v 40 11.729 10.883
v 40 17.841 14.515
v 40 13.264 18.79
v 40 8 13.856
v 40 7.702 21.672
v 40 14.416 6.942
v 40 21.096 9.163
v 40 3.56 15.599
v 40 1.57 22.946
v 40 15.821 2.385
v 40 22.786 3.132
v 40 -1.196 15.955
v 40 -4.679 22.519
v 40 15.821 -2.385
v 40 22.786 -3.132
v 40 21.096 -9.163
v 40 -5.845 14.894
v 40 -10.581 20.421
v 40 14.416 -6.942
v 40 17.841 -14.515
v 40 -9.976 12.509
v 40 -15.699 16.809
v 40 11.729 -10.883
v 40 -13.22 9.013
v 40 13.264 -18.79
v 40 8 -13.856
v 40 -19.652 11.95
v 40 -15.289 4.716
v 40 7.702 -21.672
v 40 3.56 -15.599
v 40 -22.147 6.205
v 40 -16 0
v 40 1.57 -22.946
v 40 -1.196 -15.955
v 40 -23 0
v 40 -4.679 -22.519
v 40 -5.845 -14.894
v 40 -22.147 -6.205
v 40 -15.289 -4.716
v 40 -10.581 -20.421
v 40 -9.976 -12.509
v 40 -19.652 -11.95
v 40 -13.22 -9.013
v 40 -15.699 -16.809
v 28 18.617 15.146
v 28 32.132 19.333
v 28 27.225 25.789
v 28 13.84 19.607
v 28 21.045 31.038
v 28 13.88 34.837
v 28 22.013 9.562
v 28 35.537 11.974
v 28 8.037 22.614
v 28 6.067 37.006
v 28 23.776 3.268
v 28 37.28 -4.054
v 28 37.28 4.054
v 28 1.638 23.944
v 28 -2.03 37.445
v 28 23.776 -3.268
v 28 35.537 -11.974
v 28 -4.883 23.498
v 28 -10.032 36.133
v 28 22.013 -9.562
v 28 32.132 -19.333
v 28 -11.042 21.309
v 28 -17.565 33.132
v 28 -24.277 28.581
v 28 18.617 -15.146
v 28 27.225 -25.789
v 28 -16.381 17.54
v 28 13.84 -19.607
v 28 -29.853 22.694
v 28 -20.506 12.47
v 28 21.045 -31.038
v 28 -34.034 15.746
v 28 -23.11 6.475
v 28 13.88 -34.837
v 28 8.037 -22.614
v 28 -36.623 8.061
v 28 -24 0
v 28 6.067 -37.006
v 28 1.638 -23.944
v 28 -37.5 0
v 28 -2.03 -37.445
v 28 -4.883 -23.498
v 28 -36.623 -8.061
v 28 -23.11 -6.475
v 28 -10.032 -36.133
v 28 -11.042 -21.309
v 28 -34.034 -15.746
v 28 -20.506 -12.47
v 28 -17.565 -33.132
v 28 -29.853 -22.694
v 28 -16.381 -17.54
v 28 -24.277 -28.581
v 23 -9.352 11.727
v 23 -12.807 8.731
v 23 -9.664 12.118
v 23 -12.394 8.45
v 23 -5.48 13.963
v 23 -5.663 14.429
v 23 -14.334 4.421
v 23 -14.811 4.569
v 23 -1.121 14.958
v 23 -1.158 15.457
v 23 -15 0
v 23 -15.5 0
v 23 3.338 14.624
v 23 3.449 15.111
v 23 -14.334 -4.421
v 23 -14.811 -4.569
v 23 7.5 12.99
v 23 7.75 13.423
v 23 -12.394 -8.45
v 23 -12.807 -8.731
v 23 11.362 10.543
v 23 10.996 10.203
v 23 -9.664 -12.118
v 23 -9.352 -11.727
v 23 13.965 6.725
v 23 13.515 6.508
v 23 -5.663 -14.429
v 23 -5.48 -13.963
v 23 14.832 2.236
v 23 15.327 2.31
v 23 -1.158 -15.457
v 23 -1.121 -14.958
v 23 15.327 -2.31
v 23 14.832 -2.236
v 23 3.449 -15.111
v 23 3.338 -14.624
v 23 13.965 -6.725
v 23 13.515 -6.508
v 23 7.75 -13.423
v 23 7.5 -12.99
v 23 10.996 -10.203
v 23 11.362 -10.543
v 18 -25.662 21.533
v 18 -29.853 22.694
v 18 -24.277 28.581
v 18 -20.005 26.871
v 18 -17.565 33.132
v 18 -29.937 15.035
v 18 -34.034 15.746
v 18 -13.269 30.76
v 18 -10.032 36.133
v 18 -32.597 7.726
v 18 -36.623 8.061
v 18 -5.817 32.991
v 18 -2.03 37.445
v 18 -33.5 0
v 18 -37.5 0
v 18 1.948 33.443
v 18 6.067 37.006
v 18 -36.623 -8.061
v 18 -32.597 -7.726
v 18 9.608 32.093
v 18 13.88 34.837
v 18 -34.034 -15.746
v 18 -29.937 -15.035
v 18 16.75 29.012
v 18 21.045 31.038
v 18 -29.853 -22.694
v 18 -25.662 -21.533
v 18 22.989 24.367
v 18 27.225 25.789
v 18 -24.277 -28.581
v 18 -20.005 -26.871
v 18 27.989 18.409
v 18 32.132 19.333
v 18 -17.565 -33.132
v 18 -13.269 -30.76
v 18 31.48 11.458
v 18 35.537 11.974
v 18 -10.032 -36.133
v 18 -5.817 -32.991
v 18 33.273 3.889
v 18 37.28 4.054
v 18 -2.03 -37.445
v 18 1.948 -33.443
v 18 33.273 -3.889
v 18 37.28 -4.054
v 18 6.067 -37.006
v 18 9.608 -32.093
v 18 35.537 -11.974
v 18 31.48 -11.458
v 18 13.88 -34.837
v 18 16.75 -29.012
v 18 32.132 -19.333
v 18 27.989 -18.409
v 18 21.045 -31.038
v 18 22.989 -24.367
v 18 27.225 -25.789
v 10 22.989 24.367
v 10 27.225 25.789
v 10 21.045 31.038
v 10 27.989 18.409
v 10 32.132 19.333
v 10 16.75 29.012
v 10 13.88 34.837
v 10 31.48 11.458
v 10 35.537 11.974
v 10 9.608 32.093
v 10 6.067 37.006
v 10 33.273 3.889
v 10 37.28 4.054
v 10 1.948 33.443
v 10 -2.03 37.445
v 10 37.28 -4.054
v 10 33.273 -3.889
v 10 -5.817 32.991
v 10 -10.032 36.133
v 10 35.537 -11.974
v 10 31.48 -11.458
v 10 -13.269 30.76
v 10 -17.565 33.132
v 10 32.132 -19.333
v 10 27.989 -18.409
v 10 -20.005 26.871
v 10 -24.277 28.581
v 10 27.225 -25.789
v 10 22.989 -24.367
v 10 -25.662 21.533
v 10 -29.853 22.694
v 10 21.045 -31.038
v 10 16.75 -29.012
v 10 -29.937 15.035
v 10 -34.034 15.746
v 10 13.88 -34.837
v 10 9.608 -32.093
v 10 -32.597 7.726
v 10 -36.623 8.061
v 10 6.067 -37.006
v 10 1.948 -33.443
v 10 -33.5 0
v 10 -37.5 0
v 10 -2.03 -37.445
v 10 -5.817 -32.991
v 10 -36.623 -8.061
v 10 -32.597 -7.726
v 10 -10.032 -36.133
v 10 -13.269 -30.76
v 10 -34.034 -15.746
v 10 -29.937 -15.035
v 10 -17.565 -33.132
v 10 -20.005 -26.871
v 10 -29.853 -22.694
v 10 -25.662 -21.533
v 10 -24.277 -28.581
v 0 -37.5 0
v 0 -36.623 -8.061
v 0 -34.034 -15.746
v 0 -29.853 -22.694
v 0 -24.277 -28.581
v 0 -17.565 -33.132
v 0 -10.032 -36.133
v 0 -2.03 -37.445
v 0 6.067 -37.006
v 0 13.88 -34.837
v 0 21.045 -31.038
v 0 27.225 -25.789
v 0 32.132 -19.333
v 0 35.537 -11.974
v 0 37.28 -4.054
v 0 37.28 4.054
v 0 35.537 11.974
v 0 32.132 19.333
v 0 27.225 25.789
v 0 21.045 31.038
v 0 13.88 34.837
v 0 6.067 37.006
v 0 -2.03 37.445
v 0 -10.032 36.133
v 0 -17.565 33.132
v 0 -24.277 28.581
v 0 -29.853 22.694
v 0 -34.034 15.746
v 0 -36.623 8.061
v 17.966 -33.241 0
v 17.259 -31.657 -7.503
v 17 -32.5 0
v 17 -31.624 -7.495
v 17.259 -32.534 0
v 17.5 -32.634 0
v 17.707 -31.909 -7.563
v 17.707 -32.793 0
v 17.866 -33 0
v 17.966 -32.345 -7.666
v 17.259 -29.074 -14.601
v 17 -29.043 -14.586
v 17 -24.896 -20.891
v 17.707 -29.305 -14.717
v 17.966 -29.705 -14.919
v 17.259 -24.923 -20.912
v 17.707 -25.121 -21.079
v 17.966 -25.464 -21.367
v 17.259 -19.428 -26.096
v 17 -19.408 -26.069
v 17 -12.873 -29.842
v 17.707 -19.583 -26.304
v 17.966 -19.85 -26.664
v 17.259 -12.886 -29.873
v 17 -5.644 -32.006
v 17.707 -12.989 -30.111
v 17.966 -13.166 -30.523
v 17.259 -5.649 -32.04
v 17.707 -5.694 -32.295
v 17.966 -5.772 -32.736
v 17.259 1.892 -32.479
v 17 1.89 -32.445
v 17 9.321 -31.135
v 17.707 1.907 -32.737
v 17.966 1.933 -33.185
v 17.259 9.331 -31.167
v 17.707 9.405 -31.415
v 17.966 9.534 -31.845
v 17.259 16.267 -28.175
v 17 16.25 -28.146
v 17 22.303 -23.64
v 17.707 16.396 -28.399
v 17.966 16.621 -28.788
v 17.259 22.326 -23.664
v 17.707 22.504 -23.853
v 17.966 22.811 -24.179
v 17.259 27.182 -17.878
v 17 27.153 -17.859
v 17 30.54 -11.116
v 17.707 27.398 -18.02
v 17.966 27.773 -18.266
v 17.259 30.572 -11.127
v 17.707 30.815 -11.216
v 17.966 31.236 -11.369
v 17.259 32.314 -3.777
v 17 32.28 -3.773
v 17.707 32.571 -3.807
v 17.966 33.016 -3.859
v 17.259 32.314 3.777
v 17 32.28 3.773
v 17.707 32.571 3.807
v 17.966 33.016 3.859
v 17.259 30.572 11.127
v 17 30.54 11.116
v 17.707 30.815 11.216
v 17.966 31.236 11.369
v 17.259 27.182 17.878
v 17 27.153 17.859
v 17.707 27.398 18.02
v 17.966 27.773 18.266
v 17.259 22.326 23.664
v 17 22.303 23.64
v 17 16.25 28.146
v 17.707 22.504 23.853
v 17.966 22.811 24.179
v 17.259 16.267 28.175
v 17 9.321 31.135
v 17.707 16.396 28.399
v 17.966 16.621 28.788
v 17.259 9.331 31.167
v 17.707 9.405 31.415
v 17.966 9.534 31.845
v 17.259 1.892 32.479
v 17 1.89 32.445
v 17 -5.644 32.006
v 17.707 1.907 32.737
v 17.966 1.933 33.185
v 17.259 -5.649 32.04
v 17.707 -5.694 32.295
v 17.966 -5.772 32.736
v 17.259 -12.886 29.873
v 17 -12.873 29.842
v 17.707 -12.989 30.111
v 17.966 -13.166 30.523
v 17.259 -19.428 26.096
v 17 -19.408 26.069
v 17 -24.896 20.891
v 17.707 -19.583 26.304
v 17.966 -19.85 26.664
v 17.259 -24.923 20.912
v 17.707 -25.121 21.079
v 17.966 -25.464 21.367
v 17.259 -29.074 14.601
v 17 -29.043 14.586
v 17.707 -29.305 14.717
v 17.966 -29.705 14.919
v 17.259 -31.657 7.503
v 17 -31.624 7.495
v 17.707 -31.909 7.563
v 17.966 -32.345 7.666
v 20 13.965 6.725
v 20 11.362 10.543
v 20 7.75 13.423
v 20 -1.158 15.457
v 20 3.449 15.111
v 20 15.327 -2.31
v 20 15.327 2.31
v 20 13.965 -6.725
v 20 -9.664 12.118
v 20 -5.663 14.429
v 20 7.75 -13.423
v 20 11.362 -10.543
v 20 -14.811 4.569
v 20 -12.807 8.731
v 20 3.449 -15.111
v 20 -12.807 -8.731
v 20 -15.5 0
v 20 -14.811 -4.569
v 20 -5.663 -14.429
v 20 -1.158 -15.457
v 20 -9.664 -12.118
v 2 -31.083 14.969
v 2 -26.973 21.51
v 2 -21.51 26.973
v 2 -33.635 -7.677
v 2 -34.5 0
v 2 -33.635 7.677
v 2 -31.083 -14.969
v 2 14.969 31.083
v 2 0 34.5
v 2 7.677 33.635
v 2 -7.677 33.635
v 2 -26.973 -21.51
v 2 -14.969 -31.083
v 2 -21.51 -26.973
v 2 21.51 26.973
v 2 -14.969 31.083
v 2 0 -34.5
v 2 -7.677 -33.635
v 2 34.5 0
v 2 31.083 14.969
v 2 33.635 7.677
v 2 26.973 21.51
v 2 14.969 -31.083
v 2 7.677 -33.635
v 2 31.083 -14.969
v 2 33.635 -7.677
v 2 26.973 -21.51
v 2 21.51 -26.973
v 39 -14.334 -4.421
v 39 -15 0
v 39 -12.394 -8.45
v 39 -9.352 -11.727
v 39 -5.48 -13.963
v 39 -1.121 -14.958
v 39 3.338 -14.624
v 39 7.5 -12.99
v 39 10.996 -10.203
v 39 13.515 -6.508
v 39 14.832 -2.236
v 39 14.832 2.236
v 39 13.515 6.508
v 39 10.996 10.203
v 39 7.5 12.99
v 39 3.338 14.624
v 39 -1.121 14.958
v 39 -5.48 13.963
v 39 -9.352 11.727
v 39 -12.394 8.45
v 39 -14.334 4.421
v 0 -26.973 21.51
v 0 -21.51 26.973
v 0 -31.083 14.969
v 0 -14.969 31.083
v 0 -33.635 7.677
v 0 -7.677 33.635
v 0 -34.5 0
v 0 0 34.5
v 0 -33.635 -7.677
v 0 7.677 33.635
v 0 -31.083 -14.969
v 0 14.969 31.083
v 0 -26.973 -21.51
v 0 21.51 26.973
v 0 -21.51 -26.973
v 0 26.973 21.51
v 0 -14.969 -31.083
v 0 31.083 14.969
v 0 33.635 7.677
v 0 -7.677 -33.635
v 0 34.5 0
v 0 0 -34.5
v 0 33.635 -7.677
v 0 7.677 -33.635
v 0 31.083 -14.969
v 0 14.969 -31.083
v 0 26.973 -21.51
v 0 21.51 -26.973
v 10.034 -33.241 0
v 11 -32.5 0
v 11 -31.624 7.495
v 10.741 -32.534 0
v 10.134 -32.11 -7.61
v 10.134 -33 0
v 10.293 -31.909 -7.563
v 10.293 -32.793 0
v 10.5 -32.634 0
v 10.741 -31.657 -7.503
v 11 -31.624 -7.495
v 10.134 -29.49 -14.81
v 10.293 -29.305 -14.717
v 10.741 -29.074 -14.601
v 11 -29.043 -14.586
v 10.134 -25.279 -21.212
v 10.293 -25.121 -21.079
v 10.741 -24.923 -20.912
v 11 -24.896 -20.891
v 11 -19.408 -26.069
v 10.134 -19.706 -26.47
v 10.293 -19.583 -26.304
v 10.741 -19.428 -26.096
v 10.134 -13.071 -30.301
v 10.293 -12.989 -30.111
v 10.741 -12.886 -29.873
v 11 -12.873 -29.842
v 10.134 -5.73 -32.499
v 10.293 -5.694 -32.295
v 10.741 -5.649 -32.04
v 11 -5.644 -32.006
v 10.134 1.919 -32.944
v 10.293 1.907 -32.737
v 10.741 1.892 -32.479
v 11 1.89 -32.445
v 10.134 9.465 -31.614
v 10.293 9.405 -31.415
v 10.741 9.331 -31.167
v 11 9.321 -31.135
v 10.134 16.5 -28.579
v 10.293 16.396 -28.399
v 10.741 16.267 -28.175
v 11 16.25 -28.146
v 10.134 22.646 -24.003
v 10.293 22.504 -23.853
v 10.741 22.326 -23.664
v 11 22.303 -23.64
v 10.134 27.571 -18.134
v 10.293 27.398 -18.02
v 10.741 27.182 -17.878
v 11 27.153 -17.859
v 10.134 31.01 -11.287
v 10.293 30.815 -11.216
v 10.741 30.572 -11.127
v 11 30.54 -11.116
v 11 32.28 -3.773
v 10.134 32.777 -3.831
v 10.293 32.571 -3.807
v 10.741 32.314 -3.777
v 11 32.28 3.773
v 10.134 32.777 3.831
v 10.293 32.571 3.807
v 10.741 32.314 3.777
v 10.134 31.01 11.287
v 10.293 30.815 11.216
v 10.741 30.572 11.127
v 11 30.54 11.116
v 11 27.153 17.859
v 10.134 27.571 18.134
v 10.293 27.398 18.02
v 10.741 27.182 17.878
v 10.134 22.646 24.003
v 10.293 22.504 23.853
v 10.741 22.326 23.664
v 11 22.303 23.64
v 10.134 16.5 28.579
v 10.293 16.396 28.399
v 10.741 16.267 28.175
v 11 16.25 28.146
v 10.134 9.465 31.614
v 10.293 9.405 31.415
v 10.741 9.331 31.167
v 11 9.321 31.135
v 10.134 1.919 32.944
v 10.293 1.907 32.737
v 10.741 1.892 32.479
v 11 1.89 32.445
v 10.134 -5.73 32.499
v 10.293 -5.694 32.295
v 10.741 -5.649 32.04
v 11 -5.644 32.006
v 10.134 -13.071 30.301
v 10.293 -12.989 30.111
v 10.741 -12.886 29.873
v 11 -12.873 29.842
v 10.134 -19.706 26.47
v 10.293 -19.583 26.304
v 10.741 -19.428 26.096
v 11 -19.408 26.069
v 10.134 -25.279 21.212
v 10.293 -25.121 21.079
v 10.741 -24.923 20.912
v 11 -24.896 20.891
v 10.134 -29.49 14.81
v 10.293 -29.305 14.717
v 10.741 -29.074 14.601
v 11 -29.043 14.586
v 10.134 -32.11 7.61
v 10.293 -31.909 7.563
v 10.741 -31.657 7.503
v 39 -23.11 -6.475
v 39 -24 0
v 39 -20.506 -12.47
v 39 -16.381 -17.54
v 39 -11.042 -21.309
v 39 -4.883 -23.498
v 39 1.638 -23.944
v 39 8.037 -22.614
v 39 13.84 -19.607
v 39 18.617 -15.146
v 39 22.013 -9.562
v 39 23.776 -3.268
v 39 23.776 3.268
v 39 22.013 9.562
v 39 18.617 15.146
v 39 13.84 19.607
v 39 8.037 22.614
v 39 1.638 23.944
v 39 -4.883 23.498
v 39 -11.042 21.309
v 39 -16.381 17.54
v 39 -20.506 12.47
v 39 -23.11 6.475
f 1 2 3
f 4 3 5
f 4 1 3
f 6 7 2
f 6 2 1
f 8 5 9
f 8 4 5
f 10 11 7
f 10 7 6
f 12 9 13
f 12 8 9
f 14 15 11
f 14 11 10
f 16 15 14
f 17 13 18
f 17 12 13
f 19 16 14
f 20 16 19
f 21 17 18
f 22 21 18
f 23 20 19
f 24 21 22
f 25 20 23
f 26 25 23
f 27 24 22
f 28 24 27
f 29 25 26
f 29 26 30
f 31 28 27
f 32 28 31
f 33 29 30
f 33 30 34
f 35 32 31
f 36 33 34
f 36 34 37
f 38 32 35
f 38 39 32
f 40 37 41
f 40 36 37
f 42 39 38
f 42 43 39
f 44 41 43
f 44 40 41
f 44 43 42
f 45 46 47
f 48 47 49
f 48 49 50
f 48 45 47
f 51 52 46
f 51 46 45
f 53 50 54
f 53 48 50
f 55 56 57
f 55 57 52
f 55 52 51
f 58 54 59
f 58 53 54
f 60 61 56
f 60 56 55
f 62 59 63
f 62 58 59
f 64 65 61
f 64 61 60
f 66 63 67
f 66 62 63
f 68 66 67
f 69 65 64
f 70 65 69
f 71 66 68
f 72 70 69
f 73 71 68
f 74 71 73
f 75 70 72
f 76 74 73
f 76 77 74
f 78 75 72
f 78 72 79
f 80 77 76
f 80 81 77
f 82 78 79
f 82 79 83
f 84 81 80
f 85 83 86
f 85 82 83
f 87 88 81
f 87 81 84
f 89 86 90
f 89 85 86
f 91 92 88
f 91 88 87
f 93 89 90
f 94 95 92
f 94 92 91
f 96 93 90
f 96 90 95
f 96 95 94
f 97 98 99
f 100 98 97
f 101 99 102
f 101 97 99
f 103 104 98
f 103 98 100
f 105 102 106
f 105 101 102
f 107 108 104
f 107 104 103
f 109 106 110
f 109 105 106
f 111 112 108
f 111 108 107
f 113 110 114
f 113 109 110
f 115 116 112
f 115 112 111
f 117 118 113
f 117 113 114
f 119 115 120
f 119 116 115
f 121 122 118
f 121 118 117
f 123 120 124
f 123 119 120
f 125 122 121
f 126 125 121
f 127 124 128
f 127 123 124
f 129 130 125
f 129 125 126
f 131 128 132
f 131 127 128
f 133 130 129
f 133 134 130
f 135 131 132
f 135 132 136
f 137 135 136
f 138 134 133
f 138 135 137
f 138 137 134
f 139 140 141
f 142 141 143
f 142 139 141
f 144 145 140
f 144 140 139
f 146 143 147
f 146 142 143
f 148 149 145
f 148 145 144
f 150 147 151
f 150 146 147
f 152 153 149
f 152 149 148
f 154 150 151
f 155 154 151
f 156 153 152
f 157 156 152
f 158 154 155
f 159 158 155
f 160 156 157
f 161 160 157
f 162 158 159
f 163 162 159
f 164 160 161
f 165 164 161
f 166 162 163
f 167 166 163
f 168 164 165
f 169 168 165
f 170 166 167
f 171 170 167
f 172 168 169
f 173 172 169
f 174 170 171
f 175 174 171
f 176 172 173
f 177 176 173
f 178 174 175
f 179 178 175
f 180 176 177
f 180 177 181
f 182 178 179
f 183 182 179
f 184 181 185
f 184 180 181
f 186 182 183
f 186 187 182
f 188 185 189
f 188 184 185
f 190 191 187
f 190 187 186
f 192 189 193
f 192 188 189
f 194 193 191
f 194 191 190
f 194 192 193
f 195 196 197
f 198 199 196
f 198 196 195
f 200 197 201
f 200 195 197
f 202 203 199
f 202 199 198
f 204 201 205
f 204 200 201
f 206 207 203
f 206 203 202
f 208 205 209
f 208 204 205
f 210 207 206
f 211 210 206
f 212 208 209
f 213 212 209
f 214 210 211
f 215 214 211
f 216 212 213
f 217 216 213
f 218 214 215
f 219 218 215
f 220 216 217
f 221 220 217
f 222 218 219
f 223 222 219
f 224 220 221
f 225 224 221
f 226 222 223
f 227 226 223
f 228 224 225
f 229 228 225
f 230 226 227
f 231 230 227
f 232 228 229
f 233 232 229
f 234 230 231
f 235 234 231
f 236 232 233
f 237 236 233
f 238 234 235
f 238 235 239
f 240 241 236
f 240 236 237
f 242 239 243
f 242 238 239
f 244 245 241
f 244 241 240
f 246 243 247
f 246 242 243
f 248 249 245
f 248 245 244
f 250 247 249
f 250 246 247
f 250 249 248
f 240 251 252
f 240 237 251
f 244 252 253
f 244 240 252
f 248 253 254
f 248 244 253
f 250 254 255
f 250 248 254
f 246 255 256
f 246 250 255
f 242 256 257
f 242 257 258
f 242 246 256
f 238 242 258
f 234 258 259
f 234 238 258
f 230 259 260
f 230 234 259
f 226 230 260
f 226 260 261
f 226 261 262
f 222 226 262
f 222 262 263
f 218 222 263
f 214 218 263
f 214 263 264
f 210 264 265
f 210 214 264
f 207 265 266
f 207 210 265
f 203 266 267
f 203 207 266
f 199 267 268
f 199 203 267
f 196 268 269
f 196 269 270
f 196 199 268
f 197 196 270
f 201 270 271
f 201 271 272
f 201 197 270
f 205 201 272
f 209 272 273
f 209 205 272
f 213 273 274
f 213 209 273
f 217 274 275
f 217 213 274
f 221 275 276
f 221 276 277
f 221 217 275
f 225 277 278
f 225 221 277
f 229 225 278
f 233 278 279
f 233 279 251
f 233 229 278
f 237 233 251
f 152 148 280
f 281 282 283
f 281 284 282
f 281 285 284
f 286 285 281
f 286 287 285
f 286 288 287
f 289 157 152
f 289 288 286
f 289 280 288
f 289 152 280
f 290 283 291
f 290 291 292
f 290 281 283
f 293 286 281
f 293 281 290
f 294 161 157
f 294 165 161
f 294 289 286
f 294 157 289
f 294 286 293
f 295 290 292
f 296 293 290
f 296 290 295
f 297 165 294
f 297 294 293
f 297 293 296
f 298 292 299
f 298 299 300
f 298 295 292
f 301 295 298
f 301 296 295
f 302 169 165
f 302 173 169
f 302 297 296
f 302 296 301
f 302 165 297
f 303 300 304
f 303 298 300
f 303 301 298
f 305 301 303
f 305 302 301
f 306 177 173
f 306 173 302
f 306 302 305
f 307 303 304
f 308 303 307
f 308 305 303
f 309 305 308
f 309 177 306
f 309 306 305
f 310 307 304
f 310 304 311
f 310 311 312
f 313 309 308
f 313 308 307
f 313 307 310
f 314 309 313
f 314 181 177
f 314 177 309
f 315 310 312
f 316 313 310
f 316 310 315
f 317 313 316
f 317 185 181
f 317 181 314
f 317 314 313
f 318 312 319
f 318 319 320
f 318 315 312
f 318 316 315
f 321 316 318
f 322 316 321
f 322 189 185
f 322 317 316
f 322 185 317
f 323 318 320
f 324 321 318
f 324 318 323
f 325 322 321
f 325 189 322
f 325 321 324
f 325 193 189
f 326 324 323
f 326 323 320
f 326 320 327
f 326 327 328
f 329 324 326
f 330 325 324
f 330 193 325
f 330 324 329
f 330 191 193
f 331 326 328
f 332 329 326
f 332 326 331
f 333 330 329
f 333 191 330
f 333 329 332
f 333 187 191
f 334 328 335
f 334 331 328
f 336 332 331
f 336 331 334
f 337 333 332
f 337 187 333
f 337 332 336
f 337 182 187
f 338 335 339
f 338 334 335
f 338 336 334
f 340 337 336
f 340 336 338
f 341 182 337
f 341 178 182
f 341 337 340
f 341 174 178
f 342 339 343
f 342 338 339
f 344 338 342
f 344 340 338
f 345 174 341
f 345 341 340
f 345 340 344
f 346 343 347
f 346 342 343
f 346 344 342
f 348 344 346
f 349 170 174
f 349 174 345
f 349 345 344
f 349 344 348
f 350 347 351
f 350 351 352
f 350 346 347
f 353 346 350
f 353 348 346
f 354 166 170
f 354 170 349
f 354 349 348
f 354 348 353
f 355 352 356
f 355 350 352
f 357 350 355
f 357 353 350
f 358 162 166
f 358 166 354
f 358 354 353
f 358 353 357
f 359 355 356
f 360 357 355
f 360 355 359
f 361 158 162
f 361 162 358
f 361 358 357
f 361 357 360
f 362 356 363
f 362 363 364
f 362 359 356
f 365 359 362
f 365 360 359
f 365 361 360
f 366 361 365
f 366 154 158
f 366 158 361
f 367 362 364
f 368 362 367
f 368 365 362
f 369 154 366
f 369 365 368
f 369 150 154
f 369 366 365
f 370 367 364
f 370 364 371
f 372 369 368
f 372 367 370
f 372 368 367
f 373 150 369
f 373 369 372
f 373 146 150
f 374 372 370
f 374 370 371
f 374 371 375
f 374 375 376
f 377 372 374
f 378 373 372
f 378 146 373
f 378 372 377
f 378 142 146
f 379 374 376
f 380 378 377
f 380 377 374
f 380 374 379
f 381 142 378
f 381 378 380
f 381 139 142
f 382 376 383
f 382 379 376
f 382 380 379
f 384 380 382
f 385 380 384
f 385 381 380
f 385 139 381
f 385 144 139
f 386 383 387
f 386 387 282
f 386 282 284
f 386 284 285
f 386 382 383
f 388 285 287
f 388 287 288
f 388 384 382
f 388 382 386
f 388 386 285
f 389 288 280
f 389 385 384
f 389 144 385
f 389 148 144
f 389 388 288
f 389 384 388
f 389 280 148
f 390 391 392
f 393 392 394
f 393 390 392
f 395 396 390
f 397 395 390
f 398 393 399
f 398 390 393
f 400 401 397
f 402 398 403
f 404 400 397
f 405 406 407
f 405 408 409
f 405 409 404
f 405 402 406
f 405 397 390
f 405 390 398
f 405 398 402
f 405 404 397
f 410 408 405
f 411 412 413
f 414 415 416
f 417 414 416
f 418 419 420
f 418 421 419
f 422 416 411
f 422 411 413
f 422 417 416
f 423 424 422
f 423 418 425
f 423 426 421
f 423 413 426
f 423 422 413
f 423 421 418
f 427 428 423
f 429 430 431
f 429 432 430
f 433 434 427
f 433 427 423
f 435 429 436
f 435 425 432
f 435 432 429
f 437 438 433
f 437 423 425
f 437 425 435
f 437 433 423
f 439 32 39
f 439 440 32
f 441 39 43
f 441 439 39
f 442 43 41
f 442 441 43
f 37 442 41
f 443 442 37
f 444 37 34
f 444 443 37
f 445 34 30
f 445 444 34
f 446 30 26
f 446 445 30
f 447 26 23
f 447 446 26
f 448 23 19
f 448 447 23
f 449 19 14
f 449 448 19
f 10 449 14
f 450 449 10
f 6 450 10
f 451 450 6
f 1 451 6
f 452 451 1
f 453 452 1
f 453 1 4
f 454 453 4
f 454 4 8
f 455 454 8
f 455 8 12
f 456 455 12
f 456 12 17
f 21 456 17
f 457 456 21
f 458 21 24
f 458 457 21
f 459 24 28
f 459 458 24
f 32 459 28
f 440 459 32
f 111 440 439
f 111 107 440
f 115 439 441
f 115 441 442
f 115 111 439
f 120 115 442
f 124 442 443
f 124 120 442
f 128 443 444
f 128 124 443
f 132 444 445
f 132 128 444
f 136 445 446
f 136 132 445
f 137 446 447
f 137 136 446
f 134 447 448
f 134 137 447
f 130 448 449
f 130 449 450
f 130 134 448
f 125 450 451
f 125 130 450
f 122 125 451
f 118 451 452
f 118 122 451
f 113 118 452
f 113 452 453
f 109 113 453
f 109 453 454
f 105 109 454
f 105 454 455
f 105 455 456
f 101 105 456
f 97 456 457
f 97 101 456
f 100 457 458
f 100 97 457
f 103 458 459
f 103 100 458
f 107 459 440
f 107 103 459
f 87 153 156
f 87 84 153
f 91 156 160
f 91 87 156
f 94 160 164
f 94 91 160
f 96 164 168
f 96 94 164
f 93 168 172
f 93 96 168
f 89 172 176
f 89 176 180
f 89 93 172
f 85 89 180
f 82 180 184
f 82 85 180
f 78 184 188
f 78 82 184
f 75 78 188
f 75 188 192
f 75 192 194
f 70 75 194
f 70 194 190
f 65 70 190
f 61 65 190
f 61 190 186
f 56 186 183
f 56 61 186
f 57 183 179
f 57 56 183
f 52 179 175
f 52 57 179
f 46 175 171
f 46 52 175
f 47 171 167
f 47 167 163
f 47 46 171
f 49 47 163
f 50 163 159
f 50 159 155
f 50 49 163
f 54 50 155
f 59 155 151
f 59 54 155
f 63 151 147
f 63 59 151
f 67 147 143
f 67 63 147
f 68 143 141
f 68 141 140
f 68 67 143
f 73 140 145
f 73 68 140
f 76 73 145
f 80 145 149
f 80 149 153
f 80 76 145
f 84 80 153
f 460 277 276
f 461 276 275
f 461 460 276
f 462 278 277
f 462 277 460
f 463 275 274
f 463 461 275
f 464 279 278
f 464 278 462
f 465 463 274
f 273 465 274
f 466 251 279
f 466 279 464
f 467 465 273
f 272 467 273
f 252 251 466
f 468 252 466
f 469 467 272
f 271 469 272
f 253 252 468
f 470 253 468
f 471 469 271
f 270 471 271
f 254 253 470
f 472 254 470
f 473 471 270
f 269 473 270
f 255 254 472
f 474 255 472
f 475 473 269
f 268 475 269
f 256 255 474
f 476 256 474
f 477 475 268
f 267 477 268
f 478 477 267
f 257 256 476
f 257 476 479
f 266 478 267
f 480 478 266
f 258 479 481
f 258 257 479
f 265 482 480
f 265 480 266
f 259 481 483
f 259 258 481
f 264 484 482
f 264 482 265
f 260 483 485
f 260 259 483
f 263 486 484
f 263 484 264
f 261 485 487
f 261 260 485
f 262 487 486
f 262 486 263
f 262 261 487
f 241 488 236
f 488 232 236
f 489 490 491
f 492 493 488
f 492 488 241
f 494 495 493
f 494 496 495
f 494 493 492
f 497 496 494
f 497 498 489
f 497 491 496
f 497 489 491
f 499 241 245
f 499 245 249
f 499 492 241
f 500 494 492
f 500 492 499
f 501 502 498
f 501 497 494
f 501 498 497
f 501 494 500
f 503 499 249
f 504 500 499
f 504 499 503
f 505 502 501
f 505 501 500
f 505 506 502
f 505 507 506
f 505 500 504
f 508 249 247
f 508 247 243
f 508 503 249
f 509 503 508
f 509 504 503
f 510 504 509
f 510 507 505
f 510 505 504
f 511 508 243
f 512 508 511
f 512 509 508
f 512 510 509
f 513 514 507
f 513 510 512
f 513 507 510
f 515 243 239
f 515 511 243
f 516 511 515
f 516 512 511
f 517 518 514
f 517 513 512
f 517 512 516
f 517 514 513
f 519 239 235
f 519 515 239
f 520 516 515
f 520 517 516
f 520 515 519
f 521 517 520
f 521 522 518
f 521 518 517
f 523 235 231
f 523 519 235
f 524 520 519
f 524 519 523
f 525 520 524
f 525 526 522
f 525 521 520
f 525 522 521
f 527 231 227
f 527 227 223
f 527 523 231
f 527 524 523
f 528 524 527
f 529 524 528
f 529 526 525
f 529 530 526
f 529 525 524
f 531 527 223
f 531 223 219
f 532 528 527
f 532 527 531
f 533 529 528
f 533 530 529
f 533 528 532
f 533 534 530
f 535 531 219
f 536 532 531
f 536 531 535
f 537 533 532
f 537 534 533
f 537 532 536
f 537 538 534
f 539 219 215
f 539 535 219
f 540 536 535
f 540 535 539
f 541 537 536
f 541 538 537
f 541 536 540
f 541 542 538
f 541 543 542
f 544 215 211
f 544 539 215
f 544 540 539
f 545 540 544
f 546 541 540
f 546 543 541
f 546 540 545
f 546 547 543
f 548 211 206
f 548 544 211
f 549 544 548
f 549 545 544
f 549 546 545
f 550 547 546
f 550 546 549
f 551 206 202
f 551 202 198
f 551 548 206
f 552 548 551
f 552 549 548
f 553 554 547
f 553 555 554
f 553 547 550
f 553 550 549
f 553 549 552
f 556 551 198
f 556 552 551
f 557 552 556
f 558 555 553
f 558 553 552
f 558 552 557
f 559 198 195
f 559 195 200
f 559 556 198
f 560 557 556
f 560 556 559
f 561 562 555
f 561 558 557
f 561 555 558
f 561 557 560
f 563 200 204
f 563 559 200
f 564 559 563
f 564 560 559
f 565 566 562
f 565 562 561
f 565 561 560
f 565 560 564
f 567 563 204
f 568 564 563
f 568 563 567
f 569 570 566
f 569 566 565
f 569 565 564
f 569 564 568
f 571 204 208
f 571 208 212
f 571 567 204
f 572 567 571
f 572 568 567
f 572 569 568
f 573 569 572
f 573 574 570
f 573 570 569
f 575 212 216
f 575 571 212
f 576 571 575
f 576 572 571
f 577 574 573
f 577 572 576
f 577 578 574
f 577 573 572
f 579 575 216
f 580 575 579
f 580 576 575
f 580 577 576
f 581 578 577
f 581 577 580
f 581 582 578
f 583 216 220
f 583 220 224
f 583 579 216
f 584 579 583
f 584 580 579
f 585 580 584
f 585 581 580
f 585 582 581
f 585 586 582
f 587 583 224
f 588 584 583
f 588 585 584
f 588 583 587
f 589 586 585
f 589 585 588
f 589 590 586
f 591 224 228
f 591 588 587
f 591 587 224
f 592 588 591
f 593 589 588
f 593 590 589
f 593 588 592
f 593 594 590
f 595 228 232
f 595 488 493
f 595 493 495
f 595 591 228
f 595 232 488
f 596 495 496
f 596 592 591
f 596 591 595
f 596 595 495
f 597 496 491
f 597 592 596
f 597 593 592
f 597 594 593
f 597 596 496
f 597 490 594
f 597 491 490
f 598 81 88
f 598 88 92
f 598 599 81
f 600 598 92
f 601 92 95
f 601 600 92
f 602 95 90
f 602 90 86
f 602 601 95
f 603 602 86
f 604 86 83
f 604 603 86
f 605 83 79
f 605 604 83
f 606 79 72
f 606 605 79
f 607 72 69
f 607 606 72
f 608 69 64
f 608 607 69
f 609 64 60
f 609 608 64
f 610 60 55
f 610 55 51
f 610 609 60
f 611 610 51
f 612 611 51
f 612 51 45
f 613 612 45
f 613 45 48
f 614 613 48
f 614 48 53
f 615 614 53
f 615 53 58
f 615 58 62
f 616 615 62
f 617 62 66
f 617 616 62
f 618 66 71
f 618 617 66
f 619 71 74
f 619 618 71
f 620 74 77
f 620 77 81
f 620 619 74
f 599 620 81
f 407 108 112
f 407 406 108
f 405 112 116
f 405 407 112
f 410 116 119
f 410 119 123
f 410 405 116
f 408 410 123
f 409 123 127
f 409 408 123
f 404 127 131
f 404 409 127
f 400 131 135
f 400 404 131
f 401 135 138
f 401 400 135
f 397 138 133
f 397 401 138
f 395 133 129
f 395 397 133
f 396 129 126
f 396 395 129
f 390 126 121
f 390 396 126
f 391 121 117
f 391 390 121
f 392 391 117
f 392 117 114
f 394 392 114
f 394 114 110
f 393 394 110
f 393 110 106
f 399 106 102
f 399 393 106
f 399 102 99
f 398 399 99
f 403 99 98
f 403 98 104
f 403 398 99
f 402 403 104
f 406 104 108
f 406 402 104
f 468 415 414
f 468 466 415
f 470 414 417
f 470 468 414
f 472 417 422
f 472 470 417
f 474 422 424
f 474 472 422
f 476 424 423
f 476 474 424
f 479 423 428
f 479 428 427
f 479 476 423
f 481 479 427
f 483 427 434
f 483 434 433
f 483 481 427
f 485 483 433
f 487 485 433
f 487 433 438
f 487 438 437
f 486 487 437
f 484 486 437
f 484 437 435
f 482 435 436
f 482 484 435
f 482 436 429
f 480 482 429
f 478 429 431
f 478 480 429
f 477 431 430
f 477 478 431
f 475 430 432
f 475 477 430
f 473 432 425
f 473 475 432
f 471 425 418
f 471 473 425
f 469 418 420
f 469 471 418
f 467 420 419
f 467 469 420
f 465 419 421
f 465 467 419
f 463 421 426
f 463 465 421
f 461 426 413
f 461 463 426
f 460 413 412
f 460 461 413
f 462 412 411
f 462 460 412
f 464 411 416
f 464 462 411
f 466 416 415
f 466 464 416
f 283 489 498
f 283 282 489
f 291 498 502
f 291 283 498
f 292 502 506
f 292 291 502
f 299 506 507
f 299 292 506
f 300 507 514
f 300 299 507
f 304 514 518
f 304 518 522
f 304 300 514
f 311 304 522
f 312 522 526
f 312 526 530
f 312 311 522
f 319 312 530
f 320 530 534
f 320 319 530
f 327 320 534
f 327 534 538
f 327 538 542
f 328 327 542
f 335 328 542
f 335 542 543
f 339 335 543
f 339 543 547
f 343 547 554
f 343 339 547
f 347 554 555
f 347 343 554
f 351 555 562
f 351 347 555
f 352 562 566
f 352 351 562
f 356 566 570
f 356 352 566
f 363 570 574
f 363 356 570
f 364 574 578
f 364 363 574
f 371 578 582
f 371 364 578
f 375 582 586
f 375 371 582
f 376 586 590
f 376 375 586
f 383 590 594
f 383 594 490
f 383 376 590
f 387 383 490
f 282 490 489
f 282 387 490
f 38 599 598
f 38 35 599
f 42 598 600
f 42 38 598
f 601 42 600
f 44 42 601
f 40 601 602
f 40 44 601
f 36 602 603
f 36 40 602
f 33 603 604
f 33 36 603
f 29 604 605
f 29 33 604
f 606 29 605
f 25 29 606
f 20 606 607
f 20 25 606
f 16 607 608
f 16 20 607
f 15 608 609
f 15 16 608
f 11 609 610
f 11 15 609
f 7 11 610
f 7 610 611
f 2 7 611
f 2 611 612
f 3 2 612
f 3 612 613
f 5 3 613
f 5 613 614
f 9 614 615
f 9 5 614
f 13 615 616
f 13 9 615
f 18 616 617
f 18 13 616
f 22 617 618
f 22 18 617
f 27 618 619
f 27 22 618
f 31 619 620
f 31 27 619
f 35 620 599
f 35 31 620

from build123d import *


with BuildPart() as part:
    # Эскиз1 → Повернуть1 (revolve)
    with BuildSketch(Plane.XY, mode=Mode.PRIVATE) as revolve_1_sk:
        with BuildLine():
            Line((0, 34.5), (0, 37.5))
            Line((0, 37.5), (10, 37.5))
            Line((10, 37.5), (10, 33.5))
            ThreePointArc((10, 33.5), (10.292893219, 32.792893219), (11, 32.5))
            Line((11, 32.5), (17, 32.5))
            ThreePointArc((17, 32.5), (17.707106781, 32.792893219), (18, 33.5))
            Line((18, 33.5), (18, 37.5))
            Line((18, 37.5), (28, 37.5))
            Line((28, 37.5), (28, 24))
            Line((28, 24), (39, 24))
            Line((39, 24), (40, 23))
            Line((40, 23), (40, 16))
            Line((40, 16), (39, 15))
            Line((39, 15), (23, 15))
            Line((23, 15), (23, 15.5))
            Line((23, 15.5), (20, 15.5))
            Line((20, 15.5), (20, 0))
            Line((20, 0), (2, 0))
            Line((2, 0), (2, 34.5))
            Line((2, 34.5), (0, 34.5))
        make_face()
    revolve(revolve_1_sk.sketch.rotate(Axis((2, 0, 0), (1, 0, 0)), 180), axis=Axis((2, 0, 0), (1, 0, 0)))


solid = part.part
